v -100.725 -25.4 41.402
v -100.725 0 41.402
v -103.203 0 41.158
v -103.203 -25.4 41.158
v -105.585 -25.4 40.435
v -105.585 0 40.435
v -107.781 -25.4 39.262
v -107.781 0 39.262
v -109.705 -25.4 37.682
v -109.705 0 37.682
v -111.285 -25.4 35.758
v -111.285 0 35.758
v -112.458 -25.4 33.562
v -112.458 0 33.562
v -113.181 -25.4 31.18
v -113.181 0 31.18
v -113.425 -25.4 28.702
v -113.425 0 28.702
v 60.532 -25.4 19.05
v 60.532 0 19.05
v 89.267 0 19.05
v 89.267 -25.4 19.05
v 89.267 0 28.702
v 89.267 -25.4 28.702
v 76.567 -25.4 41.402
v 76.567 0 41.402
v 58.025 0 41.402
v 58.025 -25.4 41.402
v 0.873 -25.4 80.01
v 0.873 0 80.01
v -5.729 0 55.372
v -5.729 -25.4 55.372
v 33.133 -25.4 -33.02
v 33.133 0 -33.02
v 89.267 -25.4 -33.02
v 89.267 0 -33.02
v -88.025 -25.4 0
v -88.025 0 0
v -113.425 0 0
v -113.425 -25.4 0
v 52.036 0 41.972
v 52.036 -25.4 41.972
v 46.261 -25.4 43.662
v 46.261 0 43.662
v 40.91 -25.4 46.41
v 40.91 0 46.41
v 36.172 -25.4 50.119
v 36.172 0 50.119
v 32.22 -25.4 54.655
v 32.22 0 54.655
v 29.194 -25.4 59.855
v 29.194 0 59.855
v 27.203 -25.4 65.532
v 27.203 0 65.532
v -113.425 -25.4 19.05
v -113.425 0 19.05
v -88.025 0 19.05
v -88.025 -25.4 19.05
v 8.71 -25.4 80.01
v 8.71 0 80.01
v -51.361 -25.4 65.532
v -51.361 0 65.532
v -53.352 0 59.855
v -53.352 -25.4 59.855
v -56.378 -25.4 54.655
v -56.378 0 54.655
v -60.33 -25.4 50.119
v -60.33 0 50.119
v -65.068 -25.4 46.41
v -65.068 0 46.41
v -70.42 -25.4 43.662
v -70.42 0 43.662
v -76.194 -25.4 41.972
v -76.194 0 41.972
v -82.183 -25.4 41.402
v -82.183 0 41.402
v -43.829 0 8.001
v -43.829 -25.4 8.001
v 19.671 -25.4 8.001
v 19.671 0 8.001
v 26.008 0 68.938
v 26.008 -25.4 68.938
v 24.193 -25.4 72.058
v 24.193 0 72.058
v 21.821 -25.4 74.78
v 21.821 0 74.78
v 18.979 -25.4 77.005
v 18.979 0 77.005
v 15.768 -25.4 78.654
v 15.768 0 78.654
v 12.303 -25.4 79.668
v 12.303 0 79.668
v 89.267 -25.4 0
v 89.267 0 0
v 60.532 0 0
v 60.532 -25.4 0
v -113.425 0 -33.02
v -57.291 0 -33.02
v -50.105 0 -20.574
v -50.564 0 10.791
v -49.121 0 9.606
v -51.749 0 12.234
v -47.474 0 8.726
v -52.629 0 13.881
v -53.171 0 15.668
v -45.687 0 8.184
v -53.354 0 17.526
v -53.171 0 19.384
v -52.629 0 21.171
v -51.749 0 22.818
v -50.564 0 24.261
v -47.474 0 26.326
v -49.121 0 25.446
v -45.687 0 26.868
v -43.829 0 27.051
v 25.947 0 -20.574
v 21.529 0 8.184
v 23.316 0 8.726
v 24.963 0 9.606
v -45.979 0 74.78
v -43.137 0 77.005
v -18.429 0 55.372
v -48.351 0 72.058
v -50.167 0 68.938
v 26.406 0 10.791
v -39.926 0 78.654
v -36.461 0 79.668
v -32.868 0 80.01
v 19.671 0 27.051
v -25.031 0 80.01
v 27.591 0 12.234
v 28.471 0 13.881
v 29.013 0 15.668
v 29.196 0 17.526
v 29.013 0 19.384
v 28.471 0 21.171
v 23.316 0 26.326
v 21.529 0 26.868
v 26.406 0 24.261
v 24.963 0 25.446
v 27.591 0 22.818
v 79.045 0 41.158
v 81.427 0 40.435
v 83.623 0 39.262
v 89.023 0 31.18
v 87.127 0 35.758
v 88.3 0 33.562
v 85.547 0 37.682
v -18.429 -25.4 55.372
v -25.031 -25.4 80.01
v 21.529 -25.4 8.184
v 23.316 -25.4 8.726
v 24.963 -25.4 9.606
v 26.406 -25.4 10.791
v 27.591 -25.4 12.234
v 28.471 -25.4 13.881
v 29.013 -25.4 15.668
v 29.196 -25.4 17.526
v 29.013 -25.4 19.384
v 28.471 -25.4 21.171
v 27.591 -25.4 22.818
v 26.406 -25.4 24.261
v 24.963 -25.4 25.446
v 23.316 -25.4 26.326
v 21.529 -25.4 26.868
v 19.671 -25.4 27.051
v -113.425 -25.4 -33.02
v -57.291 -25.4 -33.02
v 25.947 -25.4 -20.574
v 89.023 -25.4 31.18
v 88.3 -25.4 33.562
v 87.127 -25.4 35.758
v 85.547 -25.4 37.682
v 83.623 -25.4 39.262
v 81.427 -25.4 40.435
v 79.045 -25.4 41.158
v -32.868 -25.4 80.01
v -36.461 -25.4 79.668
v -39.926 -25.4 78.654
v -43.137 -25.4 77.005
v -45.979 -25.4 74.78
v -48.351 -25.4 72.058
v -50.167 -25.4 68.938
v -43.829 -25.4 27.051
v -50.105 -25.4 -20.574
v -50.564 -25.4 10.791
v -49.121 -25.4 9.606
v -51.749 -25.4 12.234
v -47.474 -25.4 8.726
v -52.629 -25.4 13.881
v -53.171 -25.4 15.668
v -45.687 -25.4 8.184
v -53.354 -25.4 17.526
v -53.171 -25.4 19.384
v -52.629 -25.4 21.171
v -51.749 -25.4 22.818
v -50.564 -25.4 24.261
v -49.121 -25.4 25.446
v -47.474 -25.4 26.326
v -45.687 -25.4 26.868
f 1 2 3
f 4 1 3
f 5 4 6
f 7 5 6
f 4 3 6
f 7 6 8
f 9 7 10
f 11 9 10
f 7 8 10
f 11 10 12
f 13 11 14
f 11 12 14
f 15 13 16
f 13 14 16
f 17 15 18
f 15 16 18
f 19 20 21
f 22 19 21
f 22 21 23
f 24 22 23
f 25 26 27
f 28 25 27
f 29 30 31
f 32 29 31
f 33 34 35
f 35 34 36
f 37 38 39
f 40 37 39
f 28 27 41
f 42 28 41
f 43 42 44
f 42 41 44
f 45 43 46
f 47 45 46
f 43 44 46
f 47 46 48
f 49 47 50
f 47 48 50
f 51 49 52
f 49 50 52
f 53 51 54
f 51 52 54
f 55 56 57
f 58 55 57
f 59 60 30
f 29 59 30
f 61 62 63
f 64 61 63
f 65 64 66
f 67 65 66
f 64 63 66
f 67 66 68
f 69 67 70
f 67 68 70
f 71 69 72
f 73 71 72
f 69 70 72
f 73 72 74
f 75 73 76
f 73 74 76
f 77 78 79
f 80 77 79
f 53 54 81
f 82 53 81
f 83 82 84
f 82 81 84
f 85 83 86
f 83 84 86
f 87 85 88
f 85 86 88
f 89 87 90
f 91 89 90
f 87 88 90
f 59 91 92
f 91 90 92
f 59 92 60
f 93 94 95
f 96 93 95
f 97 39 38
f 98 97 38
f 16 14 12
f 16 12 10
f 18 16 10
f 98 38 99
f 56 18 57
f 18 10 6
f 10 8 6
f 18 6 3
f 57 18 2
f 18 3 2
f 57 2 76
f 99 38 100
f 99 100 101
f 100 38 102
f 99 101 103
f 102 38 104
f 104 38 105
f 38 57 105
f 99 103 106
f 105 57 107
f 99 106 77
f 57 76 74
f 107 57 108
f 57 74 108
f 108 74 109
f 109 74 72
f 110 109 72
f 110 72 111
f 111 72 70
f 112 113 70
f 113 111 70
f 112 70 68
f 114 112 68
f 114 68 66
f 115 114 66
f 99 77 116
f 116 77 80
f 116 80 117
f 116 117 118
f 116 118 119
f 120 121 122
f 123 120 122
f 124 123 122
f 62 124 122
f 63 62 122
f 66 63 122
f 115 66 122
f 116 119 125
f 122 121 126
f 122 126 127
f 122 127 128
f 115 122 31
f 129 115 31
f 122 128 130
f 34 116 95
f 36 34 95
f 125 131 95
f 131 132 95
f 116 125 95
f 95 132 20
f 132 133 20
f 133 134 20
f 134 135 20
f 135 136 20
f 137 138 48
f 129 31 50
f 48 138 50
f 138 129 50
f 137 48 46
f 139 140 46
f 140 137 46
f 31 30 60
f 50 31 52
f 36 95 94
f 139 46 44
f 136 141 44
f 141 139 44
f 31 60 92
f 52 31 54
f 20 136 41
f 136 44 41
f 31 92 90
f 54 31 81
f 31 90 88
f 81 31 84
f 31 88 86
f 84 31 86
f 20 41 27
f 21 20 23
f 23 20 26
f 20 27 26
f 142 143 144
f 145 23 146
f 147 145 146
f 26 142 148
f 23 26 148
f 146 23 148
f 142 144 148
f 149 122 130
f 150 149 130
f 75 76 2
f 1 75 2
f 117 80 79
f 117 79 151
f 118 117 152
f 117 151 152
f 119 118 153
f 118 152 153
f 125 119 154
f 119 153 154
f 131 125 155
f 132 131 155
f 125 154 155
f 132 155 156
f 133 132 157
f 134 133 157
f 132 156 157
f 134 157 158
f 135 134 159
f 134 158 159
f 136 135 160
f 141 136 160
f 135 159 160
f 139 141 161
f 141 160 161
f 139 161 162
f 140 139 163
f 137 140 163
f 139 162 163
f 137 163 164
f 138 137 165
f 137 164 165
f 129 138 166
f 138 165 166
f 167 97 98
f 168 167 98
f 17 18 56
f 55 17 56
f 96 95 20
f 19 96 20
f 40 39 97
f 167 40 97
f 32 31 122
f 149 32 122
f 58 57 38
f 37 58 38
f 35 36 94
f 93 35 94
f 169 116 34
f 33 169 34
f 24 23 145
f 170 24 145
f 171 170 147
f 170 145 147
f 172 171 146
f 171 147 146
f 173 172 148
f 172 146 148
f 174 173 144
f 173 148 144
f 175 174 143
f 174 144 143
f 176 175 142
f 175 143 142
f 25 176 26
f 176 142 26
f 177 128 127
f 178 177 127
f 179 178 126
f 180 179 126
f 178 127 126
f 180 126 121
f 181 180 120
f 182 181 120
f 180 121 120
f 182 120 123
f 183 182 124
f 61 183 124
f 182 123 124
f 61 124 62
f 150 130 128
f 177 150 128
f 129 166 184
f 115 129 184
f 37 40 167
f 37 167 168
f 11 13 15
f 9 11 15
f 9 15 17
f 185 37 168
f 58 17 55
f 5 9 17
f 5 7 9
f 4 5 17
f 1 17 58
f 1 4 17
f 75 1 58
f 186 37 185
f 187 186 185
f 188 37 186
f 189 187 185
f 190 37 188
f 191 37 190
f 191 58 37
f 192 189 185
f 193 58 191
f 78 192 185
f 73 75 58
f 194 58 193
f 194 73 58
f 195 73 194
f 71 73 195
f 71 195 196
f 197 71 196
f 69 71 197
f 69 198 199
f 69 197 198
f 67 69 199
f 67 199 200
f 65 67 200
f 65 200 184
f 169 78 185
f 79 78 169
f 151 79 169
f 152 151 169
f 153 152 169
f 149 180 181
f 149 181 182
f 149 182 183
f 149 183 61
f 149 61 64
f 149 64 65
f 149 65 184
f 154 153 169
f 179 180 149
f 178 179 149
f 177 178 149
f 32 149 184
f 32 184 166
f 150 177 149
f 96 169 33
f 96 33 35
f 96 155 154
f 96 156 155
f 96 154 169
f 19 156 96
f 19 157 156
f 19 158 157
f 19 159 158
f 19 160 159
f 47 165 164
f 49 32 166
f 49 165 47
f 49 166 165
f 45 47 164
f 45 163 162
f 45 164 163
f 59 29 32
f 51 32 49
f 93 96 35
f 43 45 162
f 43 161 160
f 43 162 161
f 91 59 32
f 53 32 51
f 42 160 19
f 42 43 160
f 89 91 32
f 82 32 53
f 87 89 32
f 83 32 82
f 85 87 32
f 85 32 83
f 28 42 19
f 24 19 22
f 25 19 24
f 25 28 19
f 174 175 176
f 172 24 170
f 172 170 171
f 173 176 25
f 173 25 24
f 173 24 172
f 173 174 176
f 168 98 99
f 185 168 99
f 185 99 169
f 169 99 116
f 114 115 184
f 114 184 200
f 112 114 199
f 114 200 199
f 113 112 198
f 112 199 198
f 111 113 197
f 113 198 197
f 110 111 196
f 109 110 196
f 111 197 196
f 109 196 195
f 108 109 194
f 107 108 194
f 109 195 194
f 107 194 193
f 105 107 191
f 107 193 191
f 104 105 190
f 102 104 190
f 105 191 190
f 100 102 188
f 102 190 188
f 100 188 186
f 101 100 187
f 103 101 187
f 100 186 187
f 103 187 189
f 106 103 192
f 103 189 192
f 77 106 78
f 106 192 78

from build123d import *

# Parameters (mm, degrees)
F1_DEPTH = 25.4
F3_DEPTH = 25.4


with BuildPart() as f1:
    # F0 (on Front) → F1 (new body)
    with BuildSketch(Plane.XZ):
        with BuildLine():
            Line((60.532423, 0), (60.532423, 19.05))
            Line((60.532423, 19.05), (89.266929, 19.05))
            Line((89.266929, 19.05), (89.266929, 28.702))
            ThreePointArc((89.266929, 28.702), (85.547185, 37.682256), (76.566929, 41.402))
            Line((76.566929, 41.402), (58.024929, 41.402))
            ThreePointArc((58.024929, 41.402), (38.452915, 48.152025), (27.20289, 65.532))
            ThreePointArc((27.20289, 65.532), (20.452875, 75.959985), (8.709666, 80.01))
            Line((8.709666, 80.01), (0.872661, 80.01))
            Line((0.872661, 80.01), (-5.729071, 55.372))
            Line((-5.729071, 55.372), (-18.429071, 55.372))
            Line((-18.429071, 55.372), (-25.030803, 80.01))
            Line((-25.030803, 80.01), (-32.867808, 80.01))
            ThreePointArc((-32.867808, 80.01), (-44.611017, 75.959985), (-51.361032, 65.532))
            ThreePointArc((-51.361032, 65.532), (-62.611057, 48.152025), (-82.183071, 41.402))
            Line((-82.183071, 41.402), (-100.725071, 41.402))
            ThreePointArc((-100.725071, 41.402), (-109.705327, 37.682256), (-113.425071, 28.702))
            Line((-113.425071, 28.702), (-113.425071, 19.05))
            Line((-113.425071, 19.05), (-88.025071, 19.05))
            Line((-88.025071, 19.05), (-88.025071, 0))
            Line((-88.025071, 0), (-113.425071, 0))
            Line((-113.425071, 0), (-113.425071, -33.02))
            Line((-113.425071, -33.02), (-57.291071, -33.02))
            Line((-57.291071, -33.02), (-50.10537, -20.574))
            Line((-50.10537, -20.574), (25.947228, -20.574))
            Line((25.947228, -20.574), (33.132929, -33.02))
            Line((33.132929, -33.02), (89.266929, -33.02))
            Line((89.266929, -33.02), (89.266929, 0))
            Line((89.266929, 0), (60.532423, 0))
        make_face()
    extrude(amount=F1_DEPTH)

    # F2 (on face) + F0 (on Front) → F3 (cut)
    with BuildSketch(Plane.XZ.offset(25.4)):
        with BuildLine():
            Line((19.670929, 27.051), (-43.829071, 27.051))
            ThreePointArc((-43.829071, 27.051), (-53.354071, 17.526), (-43.829071, 8.001))
            Line((-43.829071, 8.001), (19.670929, 8.001))
            ThreePointArc((19.670929, 8.001), (29.195929, 17.526), (19.670929, 27.051))
        make_face()
    with BuildSketch(Plane.XZ):
        with BuildLine():
            Line((60.532423, 0), (60.532423, 19.05))
            Line((60.532423, 19.05), (89.266929, 19.05))
            Line((89.266929, 19.05), (89.266929, 28.702))
            ThreePointArc((89.266929, 28.702), (85.547185, 37.682256), (76.566929, 41.402))
            Line((76.566929, 41.402), (58.024929, 41.402))
            ThreePointArc((58.024929, 41.402), (38.452915, 48.152025), (27.20289, 65.532))
            ThreePointArc((27.20289, 65.532), (20.452875, 75.959985), (8.709666, 80.01))
            Line((8.709666, 80.01), (0.872661, 80.01))
            Line((0.872661, 80.01), (-5.729071, 55.372))
            Line((-5.729071, 55.372), (-18.429071, 55.372))
            Line((-18.429071, 55.372), (-25.030803, 80.01))
            Line((-25.030803, 80.01), (-32.867808, 80.01))
            ThreePointArc((-32.867808, 80.01), (-44.611017, 75.959985), (-51.361032, 65.532))
            ThreePointArc((-51.361032, 65.532), (-62.611057, 48.152025), (-82.183071, 41.402))
            Line((-82.183071, 41.402), (-100.725071, 41.402))
            ThreePointArc((-100.725071, 41.402), (-109.705327, 37.682256), (-113.425071, 28.702))
            Line((-113.425071, 28.702), (-113.425071, 19.05))
            Line((-113.425071, 19.05), (-88.025071, 19.05))
            Line((-88.025071, 19.05), (-88.025071, 0))
            Line((-88.025071, 0), (-113.425071, 0))
            Line((-113.425071, 0), (-113.425071, -33.02))
            Line((-113.425071, -33.02), (-57.291071, -33.02))
            Line((-57.291071, -33.02), (-50.10537, -20.574))
            Line((-50.10537, -20.574), (25.947228, -20.574))
            Line((25.947228, -20.574), (33.132929, -33.02))
            Line((33.132929, -33.02), (89.266929, -33.02))
            Line((89.266929, -33.02), (89.266929, 0))
            Line((89.266929, 0), (60.532423, 0))
        make_face()
    extrude(amount=-F3_DEPTH, mode=Mode.SUBTRACT)


solid = f1.part
